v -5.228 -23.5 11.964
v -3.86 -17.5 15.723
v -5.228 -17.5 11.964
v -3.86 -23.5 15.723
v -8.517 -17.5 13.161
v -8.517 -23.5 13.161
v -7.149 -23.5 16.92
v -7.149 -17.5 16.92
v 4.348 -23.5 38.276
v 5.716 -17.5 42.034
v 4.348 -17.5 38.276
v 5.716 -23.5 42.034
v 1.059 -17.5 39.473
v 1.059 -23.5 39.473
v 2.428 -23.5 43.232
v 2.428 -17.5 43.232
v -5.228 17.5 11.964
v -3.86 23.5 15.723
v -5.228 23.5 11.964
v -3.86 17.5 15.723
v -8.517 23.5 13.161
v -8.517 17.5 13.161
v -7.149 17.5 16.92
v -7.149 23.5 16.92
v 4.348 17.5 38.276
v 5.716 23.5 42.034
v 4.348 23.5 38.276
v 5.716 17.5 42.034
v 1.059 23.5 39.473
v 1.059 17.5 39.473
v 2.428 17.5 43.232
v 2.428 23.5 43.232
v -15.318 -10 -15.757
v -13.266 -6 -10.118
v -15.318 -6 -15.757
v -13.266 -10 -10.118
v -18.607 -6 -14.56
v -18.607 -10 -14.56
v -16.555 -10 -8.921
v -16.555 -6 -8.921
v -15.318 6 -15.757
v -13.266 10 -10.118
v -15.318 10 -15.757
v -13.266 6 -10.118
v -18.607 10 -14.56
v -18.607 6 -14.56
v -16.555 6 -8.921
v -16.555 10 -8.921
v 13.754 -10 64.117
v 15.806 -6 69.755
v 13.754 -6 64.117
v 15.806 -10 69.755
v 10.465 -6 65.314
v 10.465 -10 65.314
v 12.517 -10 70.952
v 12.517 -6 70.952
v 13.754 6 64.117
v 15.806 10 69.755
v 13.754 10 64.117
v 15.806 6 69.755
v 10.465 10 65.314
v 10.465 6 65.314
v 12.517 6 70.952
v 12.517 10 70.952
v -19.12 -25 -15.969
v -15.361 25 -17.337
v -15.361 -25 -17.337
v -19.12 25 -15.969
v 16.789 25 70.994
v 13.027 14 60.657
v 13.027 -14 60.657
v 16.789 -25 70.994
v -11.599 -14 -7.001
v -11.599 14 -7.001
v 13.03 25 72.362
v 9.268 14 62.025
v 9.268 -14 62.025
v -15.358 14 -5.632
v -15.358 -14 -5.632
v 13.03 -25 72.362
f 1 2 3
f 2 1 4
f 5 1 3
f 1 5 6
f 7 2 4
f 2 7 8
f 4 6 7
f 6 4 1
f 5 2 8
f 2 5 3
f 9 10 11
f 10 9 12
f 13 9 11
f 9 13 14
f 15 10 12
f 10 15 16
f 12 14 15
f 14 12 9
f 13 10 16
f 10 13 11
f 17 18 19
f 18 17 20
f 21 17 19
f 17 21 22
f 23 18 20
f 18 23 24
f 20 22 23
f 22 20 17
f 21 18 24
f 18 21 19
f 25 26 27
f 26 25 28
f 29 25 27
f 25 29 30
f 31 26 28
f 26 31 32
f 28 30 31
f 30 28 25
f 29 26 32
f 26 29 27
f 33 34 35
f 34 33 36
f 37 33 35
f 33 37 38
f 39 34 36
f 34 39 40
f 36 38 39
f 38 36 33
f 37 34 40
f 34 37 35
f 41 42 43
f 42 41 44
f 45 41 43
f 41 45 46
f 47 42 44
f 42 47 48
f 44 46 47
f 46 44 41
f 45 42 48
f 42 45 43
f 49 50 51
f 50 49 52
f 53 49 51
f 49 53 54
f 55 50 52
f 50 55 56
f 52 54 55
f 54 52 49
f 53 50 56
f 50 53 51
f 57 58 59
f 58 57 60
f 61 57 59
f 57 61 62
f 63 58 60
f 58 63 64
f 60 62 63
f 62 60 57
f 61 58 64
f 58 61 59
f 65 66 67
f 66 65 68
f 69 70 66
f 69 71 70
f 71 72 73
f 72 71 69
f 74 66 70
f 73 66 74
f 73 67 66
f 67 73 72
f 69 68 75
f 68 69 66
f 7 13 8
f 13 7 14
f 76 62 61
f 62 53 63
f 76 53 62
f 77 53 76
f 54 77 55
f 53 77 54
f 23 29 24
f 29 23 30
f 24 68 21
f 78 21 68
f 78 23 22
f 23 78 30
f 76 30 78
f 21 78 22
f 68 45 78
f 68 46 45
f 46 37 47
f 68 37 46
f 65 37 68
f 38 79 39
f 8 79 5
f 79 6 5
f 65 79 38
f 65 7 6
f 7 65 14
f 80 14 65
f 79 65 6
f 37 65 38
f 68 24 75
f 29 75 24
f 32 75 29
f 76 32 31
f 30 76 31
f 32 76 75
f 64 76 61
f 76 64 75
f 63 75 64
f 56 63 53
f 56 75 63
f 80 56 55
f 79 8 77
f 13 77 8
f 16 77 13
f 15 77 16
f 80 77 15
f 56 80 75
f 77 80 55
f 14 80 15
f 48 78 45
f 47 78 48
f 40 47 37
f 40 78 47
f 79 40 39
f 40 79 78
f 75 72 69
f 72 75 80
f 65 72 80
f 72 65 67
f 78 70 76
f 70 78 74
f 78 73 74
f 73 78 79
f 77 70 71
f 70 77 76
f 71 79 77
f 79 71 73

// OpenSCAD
// 80 mm case fan -> 72 x 28 mm right-angle duct adapter
//
// Axis convention (matches request)
//   - Fan mounts to the flange in the XY plane at z = 0, air enters along +Z.
//   - The 90 degree turn is in the XZ plane, so the bend axis is Y.
//   - The 28 mm outlet side is parallel to that bend axis (Y).
//   - The 72 mm outlet side is the in-plane/radial dimension (Z at the outlet).
//   - Air exits along -X.
//
// The duct itself is one watertight polyhedron: outer skin + inner skin +
// annular caps. No boolean is needed to hollow it. The fan flange and outlet
// rim are simple CSG boxes added afterwards.

$fn = 64;

// ---------------- parameters ----------------
fan_hole_pitch = 71.5;   // standard 80 mm fan hole spacing
fan_hole_d     = 4.5;    // M4 clearance
fan_pad_r      = 6.5;    // corner pads so the M4 holes have material around them
fan_tie_w      = 6.0;    // zip-tie slot width
fan_tie_l      = 4.0;    // zip-tie slot length (1 mm web each side of flange)
fan_tie_pos    = 41.0;   // slot center distance from flange center
fan_tie_pair   = 9.0;    // ± offset of the two slots on each flange side

inlet_clear   = 76;      // clear square throat at fan
wall          = 2.0;     // duct wall thickness (5 perimeters at 0.4 mm nozzle)

flange_t      = 5;       // fan flange thickness
flange_outer  = 88;      // fan flange outer size

// M3 pilot holes for self-tapping screws in the fan corner pads (alternative
// to zip ties). Set to 0 to remove them.
fan_pilot_d       = 2.6;
fan_pilot_offset  = 4.8; // distance from M4 hole center, toward the flange edge

out_radial    = 72;      // outlet clear dim in bend plane (Z at outlet)
out_axis      = 28;      // outlet clear dim along bend axis (Y)
out_lip       = 10;      // straight run after arc

center_r      = 55;      // centerline bend radius
lead_in       = 12;      // vertical lead before arc
bend_angle    = 70;      // 90 - trim; stop 20 deg early -> min slope ~20 deg

rim_t         = 3;       // outlet rim thickness
rim_extra     = 9;       // rim overhang per side (gives 1.5 mm web around 6 mm slots)
rim_tie_pair_z = 14;     // ± Z offset of tie slots on the Y-side tabs
rim_tie_pair_y = 8;      // ± Y offset of tie slots on the Z-side tabs

n_straight    = 4;
n_bend        = 32;
n_out         = 4;
taper_exp     = 1.5;     // >1 keeps section large deeper into the bend

// ---------------- derived ----------------
in_half    = inlet_clear/2;
out_r_half = out_radial/2;
out_a_half = out_axis/2;

z_start   = flange_t - 1 + lead_in;   // arc start (duct overlaps flange)
th_end    = bend_angle * 3.14159265/180;
ce        = abs(cos(th_end)) < 1e-9 ? 0 : cos(th_end);  // snap avoids CGAL slivers at 90 deg
se        = abs(sin(th_end)) < 1e-9 ? 0 : sin(th_end);
arc_end_x = -center_r + center_r*ce;
arc_end_z = z_start + center_r*se;
outlet_x  = arc_end_x - out_lip*se;
outlet_z  = arc_end_z + out_lip*ce;
rim_rot   = 90 - bend_angle;          // rim frame rotation about Y

// ---------------- path ----------------
// Section = [cx, cz, nx, nz, half_radial, half_axis]
// (nx,nz) = in-plane radial unit vector; tangent = (-nz, nx).
function path_sections(n) = [
    for (i=[0:n])
    let (
        ns=n_straight, nb=n_bend, no=n_out,
        seg = i < ns ? 0 : (i < ns+nb ? 1 : 2),
        u   = seg==0 ? i/ns : (seg==1 ? (i-ns)/nb : (i-ns-nb)/no),
        th  = seg==0 ? 0 : (seg==1 ? u*bend_angle : bend_angle),
        cx  = seg==0 ? 0
            : seg==1 ? -center_r + center_r*cos(th)
            : arc_end_x - out_lip*se*u,
        cz  = seg==0 ? z_start - lead_in*(1-u)
            : seg==1 ? z_start + center_r*sin(th)
            : arc_end_z + out_lip*ce*u,
        nx  = seg==0 ? 1 : (seg==1 ? cos(th) : ce),
        nz  = seg==0 ? 0 : (seg==1 ? sin(th) : se),
        g   = pow(u_global(i,ns,nb,no,n), taper_exp),
        hr  = in_half + (out_r_half - in_half)*g,
        ha  = in_half + (out_a_half - in_half)*g
    )
    [cx, cz, nx, nz, hr, ha]
];

function u_global(i,ns,nb,no,n) = i/n;

function corner(s,a,b,off) =
    [ s[0] + s[2]*a*(s[4]+off),
      b*(s[5]+off),
      s[1] + s[3]*a*(s[4]+off) ];

function ring_verts(sec,off) = [
    for (s=sec) each [
        corner(s,-1,-1,off), corner(s, 1,-1,off),
        corner(s, 1, 1,off), corner(s,-1, 1,off)
    ]
];

// Explicit triangles: non-planar quads on a curved path are triangulated here
// instead of relying on polyhedron's internal triangulation.
function tri_quad(a,b,c,d) = [[a,c,b],[a,d,c]];
function tri_quad_rev(a,b,c,d) = [[a,b,c],[a,c,d]];

function outer_faces(nr) = [
    for (i=[0:nr-2], j=[0:3])
    let (a=4*i+j, b=4*i+(j+1)%4,
         c=4*(i+1)+(j+1)%4, d=4*(i+1)+j)
    each tri_quad(a,b,c,d)
];

function inner_faces(nr) = [
    for (i=[0:nr-2], j=[0:3])
    let (o=4*nr, a=o+4*i+j, b=o+4*i+(j+1)%4,
         c=o+4*(i+1)+(j+1)%4, d=o+4*(i+1)+j)
    each tri_quad_rev(a,b,c,d)
];

function cap_faces(nr) = [
    for (j=[0:3])
    let (j2=(j+1)%4, o=4*nr,
         last=4*(nr-1), olast=o+last)
    each concat(
        tri_quad(o+j, o+j2, j2, j),              // inlet annulus, normal -t
        tri_quad(last+j, last+j2, olast+j2, olast+j)  // outlet annulus, +t
    )
];

module hollow_duct(sec) {
    nr = len(sec);
    polyhedron(
        concat(ring_verts(sec, wall), ring_verts(sec, 0)),
        concat(outer_faces(nr), inner_faces(nr), cap_faces(nr)),
        convex=false
    );
}

// ---------------- flange and rim ----------------
module fan_flange_base() {
    // Flange plate with the square throat cut out. Pads are added afterwards
    // so the mounting holes at the corners have material around them.
    difference() {
        translate([0,0,flange_t/2])
            cube([flange_outer, flange_outer, flange_t], center=true);
        translate([0,0,-1])
            cube([inlet_clear, inlet_clear, flange_t+2], center=true);
    }
}

module fan_pads() {
    for (sx=[-1,1], sy=[-1,1])
        translate([sx*fan_hole_pitch/2, sy*fan_hole_pitch/2, flange_t/2])
            cylinder(r=fan_pad_r, h=flange_t, center=true);
}

module fan_tie_slots() {
    // Two slots on each edge of the flange, through its thickness.
    // Y-facing edges: slot long axis radial (Y).
    for (sy=[-1,1], dx=[-1,1])
        translate([dx*fan_tie_pair, sy*fan_tie_pos, flange_t/2])
            cube([fan_tie_w, fan_tie_l, flange_t+2], center=true);
    // X-facing edges: slot long axis radial (X).
    for (sx=[-1,1], dy=[-1,1])
        translate([sx*fan_tie_pos, dy*fan_tie_pair, flange_t/2])
            cube([fan_tie_l, fan_tie_w, flange_t+2], center=true);
}

module fan_holes() {
    p = fan_hole_pitch/2;
    for (sx=[-1,1], sy=[-1,1]) {
        // Standard M4 clearance hole.
        translate([sx*p, sy*p, -1])
            cylinder(d=fan_hole_d, h=flange_t+2);
        // Optional M3 self-tapping pilot, angled out toward the flange corner.
        if (fan_pilot_d > 0)
            translate([sx*(p + fan_pilot_offset/sqrt(2)),
                       sy*(p + fan_pilot_offset/sqrt(2)), -1])
                cylinder(d=fan_pilot_d, h=flange_t+2);
    }
}

module fan_flange() {
    difference() {
        union() {
            fan_flange_base();
            fan_pads();
        }
        fan_holes();
        fan_tie_slots();
    }
}

function rot_y_point(p,a) =
    [p[0]*cos(a)+p[2]*sin(a), p[1], -p[0]*sin(a)+p[2]*cos(a)];

function box_pts(c,d,a) = [
    for (p=[ [-1,-1,-1],[1,-1,-1],[1,1,-1],[-1,1,-1],
             [-1,-1,1],[1,-1,1],[1,1,1],[-1,1,1] ])
    let (q=rot_y_point([p[0]*d[0]/2, p[1]*d[1]/2, p[2]*d[2]/2], a))
    [c[0]+q[0], c[1]+q[1], c[2]+q[2]]
];

module obox(c,d,a) {
    polyhedron(box_pts(c,d,a),
        [[1,2,3,0],[7,6,5,4],[4,5,1,0],[5,6,2,1],[6,7,3,2],[7,4,0,3]],
        convex=true);
}

function rim_center(local_x) =
    let (q=rot_y_point([local_x,0,0], rim_rot))
    [outlet_x+q[0], 0, outlet_z+q[2]];

module outlet_rim() {
    ow = out_axis + 2*wall + 2*rim_extra;
    oh = out_radial + 2*wall + 2*rim_extra;
    difference() {
        obox(rim_center(-rim_t/2+0.5), [rim_t+1,ow,oh], rim_rot);
        obox(rim_center(-rim_t/2+0.5), [rim_t+3,out_axis,out_radial], rim_rot);
        ytab = out_axis/2 + wall + rim_extra/2;
        ztab = out_radial/2 + wall + rim_extra/2;
        xc = -rim_t + 0.5;
        for (sy=[-1,1], dz=[-1,1]) {
            q = rot_y_point([xc, sy*ytab, dz*rim_tie_pair_z], rim_rot);
            obox([outlet_x+q[0], q[1], outlet_z+q[2]],
                 [rim_t+3,fan_tie_w,fan_tie_l], rim_rot);
        }
        for (sz=[-1,1], dy=[-1,1]) {
            q = rot_y_point([xc, dy*rim_tie_pair_y, sz*ztab], rim_rot);
            obox([outlet_x+q[0], q[1], outlet_z+q[2]],
                 [rim_t+3,fan_tie_l,fan_tie_w], rim_rot);
        }
    }
}

module adapter() {
    union() {
        hollow_duct(path_sections(n_straight+n_bend+n_out));
        fan_flange();
        outlet_rim();
    }
}


outlet_rim();
